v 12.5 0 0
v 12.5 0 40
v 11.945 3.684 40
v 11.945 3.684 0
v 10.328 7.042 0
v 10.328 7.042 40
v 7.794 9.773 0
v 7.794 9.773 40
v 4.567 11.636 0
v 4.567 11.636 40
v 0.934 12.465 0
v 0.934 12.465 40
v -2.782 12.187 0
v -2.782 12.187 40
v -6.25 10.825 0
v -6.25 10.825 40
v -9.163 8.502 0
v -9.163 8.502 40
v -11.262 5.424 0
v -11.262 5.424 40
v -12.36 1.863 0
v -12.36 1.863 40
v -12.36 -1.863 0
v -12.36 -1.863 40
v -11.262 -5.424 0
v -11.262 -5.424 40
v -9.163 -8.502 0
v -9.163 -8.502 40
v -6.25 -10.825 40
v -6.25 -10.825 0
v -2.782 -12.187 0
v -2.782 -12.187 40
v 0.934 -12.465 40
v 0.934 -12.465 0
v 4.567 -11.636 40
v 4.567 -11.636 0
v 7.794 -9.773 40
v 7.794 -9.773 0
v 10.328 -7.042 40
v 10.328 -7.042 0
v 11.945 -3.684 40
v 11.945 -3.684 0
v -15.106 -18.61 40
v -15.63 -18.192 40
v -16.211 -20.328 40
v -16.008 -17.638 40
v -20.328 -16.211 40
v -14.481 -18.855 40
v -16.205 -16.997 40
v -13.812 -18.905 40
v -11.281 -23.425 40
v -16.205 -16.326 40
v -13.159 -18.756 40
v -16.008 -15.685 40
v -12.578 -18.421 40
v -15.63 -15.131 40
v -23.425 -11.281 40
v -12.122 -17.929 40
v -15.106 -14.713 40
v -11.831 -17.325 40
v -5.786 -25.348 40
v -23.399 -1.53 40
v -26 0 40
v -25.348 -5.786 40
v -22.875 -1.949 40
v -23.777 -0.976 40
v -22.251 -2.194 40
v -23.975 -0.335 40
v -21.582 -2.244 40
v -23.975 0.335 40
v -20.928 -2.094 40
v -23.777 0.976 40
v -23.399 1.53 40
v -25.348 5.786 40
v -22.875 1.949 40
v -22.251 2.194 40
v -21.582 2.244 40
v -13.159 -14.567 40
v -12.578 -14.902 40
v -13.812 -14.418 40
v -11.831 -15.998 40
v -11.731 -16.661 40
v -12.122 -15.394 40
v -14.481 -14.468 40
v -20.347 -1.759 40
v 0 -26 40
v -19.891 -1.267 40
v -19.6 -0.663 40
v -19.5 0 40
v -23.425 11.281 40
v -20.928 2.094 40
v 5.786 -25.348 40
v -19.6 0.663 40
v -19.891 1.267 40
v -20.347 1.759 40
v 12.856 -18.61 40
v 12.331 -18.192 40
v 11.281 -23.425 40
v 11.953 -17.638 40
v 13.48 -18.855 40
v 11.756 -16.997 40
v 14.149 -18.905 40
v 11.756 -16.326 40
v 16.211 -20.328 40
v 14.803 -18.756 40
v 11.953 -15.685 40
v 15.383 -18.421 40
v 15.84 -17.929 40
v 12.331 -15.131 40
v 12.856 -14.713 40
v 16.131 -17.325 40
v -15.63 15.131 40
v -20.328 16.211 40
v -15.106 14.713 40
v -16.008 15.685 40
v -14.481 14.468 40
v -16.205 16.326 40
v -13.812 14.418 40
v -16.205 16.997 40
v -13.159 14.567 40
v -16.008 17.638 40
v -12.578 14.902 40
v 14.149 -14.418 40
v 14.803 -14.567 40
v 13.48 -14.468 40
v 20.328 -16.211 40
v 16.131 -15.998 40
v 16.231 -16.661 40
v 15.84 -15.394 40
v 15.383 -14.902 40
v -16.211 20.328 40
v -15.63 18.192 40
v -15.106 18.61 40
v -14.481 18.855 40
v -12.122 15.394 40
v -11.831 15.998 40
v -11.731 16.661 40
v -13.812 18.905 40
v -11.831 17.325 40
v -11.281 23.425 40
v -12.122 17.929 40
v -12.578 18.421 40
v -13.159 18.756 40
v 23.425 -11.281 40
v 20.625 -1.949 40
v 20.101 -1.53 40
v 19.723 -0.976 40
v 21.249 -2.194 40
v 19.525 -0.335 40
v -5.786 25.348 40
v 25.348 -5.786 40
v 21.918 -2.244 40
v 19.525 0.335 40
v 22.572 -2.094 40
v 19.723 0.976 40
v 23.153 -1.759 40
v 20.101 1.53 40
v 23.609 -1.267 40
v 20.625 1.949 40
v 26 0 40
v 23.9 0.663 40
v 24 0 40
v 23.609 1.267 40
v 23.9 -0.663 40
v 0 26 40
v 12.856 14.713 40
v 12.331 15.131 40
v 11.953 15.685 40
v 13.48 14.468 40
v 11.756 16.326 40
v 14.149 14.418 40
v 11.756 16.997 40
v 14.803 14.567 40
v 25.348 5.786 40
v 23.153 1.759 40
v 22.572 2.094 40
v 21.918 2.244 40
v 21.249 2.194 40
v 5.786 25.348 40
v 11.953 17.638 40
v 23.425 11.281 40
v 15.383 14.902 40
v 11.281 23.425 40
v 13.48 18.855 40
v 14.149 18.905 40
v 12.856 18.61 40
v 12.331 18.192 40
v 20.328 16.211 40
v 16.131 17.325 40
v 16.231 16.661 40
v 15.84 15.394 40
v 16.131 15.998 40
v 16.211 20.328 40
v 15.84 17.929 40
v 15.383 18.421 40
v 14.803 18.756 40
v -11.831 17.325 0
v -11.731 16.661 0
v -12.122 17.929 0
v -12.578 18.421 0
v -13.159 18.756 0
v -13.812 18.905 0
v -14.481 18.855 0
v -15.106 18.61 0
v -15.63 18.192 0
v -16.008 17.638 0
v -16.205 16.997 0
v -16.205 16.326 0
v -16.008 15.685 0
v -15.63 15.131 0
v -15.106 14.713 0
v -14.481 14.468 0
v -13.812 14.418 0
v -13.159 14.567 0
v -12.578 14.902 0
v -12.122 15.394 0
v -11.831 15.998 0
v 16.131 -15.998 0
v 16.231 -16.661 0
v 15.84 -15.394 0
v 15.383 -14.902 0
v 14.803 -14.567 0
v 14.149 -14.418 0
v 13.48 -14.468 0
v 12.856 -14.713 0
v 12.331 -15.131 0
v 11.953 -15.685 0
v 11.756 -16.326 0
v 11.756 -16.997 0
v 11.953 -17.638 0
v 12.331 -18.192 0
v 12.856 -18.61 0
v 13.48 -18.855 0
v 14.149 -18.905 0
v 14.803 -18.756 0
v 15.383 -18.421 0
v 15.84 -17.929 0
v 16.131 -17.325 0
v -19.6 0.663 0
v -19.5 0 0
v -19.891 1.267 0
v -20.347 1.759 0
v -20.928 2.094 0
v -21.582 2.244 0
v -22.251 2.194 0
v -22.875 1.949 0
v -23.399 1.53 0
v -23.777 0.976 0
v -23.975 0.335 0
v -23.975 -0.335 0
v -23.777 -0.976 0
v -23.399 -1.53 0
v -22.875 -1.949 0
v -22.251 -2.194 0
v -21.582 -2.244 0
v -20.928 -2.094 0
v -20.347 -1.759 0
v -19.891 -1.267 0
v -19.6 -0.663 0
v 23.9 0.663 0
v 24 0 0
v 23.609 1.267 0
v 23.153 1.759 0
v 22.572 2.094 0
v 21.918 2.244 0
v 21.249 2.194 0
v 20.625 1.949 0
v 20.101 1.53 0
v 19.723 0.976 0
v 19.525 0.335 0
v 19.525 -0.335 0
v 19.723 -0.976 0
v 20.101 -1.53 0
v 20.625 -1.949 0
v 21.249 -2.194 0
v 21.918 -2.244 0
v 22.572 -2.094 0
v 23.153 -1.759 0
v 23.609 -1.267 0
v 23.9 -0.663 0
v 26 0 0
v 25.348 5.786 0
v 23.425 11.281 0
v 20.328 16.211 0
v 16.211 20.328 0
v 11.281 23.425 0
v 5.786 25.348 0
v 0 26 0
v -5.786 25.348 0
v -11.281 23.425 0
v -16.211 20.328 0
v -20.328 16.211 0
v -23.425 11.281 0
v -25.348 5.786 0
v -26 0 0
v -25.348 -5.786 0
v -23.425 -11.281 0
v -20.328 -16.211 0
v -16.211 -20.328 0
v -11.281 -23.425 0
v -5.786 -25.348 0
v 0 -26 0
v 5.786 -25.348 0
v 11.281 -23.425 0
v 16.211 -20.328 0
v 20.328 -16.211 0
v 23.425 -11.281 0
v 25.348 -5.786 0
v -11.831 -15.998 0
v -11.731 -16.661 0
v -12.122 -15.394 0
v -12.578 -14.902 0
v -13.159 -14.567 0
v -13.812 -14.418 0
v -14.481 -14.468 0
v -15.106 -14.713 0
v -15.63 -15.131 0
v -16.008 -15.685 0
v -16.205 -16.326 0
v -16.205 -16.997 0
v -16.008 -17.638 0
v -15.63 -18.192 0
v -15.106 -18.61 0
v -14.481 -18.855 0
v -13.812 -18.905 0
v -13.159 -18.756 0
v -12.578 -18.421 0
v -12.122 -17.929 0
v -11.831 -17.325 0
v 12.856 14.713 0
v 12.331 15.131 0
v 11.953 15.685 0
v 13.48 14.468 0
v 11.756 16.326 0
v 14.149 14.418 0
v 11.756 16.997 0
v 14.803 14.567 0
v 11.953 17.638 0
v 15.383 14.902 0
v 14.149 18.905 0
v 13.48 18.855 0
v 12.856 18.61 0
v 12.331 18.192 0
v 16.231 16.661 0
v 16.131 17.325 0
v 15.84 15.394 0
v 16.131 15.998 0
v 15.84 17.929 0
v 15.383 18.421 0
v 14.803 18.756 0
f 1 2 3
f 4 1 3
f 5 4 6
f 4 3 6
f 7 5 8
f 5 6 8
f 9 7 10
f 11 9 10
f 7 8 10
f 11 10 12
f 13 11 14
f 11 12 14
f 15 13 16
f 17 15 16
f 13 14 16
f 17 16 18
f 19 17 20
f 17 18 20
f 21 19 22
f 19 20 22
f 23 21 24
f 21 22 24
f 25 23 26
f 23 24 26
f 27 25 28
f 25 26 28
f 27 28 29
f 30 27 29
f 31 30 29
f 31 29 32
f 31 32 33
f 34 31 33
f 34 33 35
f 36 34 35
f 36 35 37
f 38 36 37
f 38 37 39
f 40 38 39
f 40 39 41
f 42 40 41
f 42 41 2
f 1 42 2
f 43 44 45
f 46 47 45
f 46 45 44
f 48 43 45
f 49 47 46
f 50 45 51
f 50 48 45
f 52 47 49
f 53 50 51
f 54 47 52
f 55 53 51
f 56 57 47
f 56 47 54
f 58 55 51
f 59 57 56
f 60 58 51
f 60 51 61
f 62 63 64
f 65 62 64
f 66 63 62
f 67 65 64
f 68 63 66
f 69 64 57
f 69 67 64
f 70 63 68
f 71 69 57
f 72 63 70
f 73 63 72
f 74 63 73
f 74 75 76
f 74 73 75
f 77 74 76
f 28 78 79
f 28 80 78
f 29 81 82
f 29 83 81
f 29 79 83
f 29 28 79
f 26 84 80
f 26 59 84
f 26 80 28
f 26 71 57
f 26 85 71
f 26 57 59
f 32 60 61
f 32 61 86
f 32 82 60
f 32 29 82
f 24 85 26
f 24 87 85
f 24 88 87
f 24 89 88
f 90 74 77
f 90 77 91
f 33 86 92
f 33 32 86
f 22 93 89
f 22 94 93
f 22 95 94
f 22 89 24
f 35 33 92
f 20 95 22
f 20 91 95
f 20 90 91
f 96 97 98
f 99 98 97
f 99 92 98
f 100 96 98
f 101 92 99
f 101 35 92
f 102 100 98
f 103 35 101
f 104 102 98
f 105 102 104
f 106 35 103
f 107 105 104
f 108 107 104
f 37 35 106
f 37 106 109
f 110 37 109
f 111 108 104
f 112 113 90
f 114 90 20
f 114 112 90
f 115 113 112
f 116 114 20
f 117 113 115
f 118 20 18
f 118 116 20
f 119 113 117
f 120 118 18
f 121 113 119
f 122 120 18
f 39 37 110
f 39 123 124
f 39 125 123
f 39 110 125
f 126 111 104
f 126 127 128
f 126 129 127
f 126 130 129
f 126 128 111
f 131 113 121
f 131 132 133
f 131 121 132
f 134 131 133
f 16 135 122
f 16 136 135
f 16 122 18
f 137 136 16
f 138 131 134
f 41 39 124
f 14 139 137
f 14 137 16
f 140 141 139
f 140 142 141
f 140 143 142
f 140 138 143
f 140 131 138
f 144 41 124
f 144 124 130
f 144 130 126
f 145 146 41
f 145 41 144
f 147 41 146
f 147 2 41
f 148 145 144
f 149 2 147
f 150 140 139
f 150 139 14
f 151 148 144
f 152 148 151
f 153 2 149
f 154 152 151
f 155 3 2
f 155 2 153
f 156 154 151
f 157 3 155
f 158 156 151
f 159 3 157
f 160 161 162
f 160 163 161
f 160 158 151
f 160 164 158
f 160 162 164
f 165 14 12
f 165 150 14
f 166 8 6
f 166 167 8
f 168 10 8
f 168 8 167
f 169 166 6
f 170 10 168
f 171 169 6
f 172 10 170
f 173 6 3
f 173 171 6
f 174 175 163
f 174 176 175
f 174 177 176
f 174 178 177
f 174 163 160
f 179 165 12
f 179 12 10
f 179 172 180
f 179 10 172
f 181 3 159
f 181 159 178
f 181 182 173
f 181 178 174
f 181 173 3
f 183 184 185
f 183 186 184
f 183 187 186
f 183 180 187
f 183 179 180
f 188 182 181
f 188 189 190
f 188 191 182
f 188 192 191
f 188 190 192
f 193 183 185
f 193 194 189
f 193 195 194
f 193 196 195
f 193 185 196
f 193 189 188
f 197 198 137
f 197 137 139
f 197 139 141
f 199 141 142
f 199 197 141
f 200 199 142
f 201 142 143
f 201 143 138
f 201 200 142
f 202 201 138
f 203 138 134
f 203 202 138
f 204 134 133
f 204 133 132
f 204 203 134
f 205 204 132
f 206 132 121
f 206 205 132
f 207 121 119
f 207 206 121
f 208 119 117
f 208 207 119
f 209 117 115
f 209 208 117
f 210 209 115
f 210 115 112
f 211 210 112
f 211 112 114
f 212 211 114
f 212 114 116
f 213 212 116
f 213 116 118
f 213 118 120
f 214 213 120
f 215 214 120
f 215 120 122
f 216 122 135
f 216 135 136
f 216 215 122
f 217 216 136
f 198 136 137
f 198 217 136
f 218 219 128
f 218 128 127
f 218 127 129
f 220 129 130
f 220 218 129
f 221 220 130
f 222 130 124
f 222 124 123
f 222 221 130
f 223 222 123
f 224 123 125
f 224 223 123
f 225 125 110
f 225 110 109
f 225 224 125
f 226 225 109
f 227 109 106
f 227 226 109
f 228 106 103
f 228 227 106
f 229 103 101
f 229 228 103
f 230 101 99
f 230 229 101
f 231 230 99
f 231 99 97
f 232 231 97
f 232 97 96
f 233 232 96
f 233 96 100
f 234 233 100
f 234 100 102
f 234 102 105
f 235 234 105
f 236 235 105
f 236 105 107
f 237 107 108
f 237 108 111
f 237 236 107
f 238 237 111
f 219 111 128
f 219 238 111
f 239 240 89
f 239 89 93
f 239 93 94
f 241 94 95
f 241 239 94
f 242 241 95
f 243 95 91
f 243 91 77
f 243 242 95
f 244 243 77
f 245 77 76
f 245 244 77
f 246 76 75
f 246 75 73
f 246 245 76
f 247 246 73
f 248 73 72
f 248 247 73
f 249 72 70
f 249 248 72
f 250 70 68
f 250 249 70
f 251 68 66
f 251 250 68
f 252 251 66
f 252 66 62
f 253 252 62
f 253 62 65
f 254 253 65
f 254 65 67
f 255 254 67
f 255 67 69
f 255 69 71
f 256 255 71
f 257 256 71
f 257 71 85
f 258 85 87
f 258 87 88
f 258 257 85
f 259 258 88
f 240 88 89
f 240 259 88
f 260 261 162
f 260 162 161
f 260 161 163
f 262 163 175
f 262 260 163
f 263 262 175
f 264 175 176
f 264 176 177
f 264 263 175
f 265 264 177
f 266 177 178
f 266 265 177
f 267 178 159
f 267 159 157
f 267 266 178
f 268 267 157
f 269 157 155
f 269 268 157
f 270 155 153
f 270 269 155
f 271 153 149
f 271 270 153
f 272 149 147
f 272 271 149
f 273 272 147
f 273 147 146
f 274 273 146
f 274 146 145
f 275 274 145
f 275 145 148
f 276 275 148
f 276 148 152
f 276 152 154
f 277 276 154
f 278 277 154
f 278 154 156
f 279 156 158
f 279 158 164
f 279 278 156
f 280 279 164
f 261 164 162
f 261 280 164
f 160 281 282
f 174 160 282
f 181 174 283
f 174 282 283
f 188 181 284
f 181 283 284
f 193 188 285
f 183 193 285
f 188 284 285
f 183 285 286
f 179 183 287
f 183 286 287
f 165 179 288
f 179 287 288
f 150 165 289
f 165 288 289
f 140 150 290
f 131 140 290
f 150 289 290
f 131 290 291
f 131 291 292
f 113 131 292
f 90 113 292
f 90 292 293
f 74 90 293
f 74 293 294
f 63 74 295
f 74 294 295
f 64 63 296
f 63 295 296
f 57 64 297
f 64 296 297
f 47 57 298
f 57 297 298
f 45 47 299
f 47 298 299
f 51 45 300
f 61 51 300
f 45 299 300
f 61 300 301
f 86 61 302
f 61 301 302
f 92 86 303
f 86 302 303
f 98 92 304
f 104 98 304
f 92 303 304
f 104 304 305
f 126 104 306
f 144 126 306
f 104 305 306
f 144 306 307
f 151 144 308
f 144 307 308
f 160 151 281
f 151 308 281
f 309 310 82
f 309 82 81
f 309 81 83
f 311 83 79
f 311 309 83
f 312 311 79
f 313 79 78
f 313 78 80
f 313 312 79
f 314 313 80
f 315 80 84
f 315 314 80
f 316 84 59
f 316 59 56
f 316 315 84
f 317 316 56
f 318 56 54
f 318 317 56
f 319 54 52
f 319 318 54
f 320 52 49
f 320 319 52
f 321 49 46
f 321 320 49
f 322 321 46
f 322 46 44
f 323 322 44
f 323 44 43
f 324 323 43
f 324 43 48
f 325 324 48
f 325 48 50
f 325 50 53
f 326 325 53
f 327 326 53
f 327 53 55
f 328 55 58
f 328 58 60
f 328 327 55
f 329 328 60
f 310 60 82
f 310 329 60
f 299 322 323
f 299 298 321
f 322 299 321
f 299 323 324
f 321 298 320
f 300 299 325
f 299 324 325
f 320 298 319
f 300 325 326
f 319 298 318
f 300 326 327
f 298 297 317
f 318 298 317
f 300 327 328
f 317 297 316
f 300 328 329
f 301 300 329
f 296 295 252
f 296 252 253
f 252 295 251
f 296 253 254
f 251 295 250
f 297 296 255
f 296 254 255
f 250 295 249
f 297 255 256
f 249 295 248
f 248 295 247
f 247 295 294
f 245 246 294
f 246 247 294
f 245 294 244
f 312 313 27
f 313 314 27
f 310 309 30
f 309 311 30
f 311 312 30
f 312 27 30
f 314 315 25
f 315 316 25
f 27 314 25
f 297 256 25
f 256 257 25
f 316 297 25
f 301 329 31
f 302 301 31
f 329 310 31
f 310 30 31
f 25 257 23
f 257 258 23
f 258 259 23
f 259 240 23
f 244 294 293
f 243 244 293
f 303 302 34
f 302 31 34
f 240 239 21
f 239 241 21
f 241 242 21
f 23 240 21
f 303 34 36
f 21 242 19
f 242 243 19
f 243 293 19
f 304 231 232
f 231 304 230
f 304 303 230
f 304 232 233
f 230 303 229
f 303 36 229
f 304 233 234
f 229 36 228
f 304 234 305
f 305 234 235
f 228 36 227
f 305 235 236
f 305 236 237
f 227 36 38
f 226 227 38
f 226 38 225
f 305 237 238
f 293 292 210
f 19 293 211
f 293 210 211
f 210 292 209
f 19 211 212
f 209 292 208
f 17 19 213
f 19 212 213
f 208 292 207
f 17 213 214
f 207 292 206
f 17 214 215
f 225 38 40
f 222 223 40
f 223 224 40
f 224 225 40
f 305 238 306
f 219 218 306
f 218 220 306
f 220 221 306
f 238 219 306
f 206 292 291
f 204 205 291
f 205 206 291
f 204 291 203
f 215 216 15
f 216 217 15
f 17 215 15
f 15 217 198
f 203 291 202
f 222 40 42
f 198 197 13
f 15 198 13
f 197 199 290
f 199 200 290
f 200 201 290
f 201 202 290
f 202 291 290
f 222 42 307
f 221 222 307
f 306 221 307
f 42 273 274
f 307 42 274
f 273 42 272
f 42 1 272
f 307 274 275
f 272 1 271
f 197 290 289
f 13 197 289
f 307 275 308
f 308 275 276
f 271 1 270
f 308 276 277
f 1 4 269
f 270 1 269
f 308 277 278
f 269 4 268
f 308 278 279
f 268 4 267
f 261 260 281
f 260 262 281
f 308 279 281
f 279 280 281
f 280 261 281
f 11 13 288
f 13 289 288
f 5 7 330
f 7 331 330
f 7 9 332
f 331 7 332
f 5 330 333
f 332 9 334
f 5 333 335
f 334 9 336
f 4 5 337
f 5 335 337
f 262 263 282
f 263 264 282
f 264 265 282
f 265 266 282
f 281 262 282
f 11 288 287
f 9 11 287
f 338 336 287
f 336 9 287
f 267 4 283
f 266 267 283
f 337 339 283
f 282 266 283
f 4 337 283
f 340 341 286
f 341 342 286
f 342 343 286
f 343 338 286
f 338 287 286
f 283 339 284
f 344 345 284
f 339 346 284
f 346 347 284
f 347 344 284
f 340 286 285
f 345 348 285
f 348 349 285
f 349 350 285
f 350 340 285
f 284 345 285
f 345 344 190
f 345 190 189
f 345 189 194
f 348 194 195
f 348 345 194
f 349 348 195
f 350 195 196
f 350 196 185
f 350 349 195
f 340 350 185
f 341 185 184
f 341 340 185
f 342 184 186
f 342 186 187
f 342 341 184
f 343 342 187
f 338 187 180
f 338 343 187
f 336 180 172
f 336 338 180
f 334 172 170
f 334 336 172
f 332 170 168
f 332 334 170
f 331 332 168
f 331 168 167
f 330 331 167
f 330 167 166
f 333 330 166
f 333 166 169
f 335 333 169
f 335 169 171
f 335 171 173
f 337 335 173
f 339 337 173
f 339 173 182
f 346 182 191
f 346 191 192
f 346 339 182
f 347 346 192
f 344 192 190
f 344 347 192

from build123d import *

# Parameters (mm, degrees)
SKETCH_1_R          = 26
SKETCH_1_R_2        = 2.25
EXTRUDE_1_DEPTH     = 40
SKETCH_2_R          = 12.5
CUT_EXTRUDE_1_DEPTH = 55.332310829


with BuildPart() as part:
    # 草图1 → 凸台-拉伸1 (new body)
    with BuildSketch(Plane.XY):
        Circle(SKETCH_1_R)
        with Locations((-21.75, 0)):
            Circle(SKETCH_1_R_2, mode=Mode.SUBTRACT)
        with Locations((-13.980630511, 16.661466638)):
            Circle(SKETCH_1_R_2, mode=Mode.SUBTRACT)
        with Locations((-13.980630511, -16.661466638)):
            Circle(SKETCH_1_R_2, mode=Mode.SUBTRACT)
        with Locations((13.980630511, -16.661466638)):
            Circle(SKETCH_1_R_2, mode=Mode.SUBTRACT)
        with Locations((21.75, 0)):
            Circle(SKETCH_1_R_2, mode=Mode.SUBTRACT)
        with Locations((13.980630511, 16.661466638)):
            Circle(SKETCH_1_R_2, mode=Mode.SUBTRACT)
    extrude(amount=EXTRUDE_1_DEPTH)

    # 草图2 → 切除-拉伸1 (cut, through all)
    with BuildSketch(Plane.XY.offset(40)):
        Circle(SKETCH_2_R)
    extrude(amount=-CUT_EXTRUDE_1_DEPTH, mode=Mode.SUBTRACT)


solid = part.part
